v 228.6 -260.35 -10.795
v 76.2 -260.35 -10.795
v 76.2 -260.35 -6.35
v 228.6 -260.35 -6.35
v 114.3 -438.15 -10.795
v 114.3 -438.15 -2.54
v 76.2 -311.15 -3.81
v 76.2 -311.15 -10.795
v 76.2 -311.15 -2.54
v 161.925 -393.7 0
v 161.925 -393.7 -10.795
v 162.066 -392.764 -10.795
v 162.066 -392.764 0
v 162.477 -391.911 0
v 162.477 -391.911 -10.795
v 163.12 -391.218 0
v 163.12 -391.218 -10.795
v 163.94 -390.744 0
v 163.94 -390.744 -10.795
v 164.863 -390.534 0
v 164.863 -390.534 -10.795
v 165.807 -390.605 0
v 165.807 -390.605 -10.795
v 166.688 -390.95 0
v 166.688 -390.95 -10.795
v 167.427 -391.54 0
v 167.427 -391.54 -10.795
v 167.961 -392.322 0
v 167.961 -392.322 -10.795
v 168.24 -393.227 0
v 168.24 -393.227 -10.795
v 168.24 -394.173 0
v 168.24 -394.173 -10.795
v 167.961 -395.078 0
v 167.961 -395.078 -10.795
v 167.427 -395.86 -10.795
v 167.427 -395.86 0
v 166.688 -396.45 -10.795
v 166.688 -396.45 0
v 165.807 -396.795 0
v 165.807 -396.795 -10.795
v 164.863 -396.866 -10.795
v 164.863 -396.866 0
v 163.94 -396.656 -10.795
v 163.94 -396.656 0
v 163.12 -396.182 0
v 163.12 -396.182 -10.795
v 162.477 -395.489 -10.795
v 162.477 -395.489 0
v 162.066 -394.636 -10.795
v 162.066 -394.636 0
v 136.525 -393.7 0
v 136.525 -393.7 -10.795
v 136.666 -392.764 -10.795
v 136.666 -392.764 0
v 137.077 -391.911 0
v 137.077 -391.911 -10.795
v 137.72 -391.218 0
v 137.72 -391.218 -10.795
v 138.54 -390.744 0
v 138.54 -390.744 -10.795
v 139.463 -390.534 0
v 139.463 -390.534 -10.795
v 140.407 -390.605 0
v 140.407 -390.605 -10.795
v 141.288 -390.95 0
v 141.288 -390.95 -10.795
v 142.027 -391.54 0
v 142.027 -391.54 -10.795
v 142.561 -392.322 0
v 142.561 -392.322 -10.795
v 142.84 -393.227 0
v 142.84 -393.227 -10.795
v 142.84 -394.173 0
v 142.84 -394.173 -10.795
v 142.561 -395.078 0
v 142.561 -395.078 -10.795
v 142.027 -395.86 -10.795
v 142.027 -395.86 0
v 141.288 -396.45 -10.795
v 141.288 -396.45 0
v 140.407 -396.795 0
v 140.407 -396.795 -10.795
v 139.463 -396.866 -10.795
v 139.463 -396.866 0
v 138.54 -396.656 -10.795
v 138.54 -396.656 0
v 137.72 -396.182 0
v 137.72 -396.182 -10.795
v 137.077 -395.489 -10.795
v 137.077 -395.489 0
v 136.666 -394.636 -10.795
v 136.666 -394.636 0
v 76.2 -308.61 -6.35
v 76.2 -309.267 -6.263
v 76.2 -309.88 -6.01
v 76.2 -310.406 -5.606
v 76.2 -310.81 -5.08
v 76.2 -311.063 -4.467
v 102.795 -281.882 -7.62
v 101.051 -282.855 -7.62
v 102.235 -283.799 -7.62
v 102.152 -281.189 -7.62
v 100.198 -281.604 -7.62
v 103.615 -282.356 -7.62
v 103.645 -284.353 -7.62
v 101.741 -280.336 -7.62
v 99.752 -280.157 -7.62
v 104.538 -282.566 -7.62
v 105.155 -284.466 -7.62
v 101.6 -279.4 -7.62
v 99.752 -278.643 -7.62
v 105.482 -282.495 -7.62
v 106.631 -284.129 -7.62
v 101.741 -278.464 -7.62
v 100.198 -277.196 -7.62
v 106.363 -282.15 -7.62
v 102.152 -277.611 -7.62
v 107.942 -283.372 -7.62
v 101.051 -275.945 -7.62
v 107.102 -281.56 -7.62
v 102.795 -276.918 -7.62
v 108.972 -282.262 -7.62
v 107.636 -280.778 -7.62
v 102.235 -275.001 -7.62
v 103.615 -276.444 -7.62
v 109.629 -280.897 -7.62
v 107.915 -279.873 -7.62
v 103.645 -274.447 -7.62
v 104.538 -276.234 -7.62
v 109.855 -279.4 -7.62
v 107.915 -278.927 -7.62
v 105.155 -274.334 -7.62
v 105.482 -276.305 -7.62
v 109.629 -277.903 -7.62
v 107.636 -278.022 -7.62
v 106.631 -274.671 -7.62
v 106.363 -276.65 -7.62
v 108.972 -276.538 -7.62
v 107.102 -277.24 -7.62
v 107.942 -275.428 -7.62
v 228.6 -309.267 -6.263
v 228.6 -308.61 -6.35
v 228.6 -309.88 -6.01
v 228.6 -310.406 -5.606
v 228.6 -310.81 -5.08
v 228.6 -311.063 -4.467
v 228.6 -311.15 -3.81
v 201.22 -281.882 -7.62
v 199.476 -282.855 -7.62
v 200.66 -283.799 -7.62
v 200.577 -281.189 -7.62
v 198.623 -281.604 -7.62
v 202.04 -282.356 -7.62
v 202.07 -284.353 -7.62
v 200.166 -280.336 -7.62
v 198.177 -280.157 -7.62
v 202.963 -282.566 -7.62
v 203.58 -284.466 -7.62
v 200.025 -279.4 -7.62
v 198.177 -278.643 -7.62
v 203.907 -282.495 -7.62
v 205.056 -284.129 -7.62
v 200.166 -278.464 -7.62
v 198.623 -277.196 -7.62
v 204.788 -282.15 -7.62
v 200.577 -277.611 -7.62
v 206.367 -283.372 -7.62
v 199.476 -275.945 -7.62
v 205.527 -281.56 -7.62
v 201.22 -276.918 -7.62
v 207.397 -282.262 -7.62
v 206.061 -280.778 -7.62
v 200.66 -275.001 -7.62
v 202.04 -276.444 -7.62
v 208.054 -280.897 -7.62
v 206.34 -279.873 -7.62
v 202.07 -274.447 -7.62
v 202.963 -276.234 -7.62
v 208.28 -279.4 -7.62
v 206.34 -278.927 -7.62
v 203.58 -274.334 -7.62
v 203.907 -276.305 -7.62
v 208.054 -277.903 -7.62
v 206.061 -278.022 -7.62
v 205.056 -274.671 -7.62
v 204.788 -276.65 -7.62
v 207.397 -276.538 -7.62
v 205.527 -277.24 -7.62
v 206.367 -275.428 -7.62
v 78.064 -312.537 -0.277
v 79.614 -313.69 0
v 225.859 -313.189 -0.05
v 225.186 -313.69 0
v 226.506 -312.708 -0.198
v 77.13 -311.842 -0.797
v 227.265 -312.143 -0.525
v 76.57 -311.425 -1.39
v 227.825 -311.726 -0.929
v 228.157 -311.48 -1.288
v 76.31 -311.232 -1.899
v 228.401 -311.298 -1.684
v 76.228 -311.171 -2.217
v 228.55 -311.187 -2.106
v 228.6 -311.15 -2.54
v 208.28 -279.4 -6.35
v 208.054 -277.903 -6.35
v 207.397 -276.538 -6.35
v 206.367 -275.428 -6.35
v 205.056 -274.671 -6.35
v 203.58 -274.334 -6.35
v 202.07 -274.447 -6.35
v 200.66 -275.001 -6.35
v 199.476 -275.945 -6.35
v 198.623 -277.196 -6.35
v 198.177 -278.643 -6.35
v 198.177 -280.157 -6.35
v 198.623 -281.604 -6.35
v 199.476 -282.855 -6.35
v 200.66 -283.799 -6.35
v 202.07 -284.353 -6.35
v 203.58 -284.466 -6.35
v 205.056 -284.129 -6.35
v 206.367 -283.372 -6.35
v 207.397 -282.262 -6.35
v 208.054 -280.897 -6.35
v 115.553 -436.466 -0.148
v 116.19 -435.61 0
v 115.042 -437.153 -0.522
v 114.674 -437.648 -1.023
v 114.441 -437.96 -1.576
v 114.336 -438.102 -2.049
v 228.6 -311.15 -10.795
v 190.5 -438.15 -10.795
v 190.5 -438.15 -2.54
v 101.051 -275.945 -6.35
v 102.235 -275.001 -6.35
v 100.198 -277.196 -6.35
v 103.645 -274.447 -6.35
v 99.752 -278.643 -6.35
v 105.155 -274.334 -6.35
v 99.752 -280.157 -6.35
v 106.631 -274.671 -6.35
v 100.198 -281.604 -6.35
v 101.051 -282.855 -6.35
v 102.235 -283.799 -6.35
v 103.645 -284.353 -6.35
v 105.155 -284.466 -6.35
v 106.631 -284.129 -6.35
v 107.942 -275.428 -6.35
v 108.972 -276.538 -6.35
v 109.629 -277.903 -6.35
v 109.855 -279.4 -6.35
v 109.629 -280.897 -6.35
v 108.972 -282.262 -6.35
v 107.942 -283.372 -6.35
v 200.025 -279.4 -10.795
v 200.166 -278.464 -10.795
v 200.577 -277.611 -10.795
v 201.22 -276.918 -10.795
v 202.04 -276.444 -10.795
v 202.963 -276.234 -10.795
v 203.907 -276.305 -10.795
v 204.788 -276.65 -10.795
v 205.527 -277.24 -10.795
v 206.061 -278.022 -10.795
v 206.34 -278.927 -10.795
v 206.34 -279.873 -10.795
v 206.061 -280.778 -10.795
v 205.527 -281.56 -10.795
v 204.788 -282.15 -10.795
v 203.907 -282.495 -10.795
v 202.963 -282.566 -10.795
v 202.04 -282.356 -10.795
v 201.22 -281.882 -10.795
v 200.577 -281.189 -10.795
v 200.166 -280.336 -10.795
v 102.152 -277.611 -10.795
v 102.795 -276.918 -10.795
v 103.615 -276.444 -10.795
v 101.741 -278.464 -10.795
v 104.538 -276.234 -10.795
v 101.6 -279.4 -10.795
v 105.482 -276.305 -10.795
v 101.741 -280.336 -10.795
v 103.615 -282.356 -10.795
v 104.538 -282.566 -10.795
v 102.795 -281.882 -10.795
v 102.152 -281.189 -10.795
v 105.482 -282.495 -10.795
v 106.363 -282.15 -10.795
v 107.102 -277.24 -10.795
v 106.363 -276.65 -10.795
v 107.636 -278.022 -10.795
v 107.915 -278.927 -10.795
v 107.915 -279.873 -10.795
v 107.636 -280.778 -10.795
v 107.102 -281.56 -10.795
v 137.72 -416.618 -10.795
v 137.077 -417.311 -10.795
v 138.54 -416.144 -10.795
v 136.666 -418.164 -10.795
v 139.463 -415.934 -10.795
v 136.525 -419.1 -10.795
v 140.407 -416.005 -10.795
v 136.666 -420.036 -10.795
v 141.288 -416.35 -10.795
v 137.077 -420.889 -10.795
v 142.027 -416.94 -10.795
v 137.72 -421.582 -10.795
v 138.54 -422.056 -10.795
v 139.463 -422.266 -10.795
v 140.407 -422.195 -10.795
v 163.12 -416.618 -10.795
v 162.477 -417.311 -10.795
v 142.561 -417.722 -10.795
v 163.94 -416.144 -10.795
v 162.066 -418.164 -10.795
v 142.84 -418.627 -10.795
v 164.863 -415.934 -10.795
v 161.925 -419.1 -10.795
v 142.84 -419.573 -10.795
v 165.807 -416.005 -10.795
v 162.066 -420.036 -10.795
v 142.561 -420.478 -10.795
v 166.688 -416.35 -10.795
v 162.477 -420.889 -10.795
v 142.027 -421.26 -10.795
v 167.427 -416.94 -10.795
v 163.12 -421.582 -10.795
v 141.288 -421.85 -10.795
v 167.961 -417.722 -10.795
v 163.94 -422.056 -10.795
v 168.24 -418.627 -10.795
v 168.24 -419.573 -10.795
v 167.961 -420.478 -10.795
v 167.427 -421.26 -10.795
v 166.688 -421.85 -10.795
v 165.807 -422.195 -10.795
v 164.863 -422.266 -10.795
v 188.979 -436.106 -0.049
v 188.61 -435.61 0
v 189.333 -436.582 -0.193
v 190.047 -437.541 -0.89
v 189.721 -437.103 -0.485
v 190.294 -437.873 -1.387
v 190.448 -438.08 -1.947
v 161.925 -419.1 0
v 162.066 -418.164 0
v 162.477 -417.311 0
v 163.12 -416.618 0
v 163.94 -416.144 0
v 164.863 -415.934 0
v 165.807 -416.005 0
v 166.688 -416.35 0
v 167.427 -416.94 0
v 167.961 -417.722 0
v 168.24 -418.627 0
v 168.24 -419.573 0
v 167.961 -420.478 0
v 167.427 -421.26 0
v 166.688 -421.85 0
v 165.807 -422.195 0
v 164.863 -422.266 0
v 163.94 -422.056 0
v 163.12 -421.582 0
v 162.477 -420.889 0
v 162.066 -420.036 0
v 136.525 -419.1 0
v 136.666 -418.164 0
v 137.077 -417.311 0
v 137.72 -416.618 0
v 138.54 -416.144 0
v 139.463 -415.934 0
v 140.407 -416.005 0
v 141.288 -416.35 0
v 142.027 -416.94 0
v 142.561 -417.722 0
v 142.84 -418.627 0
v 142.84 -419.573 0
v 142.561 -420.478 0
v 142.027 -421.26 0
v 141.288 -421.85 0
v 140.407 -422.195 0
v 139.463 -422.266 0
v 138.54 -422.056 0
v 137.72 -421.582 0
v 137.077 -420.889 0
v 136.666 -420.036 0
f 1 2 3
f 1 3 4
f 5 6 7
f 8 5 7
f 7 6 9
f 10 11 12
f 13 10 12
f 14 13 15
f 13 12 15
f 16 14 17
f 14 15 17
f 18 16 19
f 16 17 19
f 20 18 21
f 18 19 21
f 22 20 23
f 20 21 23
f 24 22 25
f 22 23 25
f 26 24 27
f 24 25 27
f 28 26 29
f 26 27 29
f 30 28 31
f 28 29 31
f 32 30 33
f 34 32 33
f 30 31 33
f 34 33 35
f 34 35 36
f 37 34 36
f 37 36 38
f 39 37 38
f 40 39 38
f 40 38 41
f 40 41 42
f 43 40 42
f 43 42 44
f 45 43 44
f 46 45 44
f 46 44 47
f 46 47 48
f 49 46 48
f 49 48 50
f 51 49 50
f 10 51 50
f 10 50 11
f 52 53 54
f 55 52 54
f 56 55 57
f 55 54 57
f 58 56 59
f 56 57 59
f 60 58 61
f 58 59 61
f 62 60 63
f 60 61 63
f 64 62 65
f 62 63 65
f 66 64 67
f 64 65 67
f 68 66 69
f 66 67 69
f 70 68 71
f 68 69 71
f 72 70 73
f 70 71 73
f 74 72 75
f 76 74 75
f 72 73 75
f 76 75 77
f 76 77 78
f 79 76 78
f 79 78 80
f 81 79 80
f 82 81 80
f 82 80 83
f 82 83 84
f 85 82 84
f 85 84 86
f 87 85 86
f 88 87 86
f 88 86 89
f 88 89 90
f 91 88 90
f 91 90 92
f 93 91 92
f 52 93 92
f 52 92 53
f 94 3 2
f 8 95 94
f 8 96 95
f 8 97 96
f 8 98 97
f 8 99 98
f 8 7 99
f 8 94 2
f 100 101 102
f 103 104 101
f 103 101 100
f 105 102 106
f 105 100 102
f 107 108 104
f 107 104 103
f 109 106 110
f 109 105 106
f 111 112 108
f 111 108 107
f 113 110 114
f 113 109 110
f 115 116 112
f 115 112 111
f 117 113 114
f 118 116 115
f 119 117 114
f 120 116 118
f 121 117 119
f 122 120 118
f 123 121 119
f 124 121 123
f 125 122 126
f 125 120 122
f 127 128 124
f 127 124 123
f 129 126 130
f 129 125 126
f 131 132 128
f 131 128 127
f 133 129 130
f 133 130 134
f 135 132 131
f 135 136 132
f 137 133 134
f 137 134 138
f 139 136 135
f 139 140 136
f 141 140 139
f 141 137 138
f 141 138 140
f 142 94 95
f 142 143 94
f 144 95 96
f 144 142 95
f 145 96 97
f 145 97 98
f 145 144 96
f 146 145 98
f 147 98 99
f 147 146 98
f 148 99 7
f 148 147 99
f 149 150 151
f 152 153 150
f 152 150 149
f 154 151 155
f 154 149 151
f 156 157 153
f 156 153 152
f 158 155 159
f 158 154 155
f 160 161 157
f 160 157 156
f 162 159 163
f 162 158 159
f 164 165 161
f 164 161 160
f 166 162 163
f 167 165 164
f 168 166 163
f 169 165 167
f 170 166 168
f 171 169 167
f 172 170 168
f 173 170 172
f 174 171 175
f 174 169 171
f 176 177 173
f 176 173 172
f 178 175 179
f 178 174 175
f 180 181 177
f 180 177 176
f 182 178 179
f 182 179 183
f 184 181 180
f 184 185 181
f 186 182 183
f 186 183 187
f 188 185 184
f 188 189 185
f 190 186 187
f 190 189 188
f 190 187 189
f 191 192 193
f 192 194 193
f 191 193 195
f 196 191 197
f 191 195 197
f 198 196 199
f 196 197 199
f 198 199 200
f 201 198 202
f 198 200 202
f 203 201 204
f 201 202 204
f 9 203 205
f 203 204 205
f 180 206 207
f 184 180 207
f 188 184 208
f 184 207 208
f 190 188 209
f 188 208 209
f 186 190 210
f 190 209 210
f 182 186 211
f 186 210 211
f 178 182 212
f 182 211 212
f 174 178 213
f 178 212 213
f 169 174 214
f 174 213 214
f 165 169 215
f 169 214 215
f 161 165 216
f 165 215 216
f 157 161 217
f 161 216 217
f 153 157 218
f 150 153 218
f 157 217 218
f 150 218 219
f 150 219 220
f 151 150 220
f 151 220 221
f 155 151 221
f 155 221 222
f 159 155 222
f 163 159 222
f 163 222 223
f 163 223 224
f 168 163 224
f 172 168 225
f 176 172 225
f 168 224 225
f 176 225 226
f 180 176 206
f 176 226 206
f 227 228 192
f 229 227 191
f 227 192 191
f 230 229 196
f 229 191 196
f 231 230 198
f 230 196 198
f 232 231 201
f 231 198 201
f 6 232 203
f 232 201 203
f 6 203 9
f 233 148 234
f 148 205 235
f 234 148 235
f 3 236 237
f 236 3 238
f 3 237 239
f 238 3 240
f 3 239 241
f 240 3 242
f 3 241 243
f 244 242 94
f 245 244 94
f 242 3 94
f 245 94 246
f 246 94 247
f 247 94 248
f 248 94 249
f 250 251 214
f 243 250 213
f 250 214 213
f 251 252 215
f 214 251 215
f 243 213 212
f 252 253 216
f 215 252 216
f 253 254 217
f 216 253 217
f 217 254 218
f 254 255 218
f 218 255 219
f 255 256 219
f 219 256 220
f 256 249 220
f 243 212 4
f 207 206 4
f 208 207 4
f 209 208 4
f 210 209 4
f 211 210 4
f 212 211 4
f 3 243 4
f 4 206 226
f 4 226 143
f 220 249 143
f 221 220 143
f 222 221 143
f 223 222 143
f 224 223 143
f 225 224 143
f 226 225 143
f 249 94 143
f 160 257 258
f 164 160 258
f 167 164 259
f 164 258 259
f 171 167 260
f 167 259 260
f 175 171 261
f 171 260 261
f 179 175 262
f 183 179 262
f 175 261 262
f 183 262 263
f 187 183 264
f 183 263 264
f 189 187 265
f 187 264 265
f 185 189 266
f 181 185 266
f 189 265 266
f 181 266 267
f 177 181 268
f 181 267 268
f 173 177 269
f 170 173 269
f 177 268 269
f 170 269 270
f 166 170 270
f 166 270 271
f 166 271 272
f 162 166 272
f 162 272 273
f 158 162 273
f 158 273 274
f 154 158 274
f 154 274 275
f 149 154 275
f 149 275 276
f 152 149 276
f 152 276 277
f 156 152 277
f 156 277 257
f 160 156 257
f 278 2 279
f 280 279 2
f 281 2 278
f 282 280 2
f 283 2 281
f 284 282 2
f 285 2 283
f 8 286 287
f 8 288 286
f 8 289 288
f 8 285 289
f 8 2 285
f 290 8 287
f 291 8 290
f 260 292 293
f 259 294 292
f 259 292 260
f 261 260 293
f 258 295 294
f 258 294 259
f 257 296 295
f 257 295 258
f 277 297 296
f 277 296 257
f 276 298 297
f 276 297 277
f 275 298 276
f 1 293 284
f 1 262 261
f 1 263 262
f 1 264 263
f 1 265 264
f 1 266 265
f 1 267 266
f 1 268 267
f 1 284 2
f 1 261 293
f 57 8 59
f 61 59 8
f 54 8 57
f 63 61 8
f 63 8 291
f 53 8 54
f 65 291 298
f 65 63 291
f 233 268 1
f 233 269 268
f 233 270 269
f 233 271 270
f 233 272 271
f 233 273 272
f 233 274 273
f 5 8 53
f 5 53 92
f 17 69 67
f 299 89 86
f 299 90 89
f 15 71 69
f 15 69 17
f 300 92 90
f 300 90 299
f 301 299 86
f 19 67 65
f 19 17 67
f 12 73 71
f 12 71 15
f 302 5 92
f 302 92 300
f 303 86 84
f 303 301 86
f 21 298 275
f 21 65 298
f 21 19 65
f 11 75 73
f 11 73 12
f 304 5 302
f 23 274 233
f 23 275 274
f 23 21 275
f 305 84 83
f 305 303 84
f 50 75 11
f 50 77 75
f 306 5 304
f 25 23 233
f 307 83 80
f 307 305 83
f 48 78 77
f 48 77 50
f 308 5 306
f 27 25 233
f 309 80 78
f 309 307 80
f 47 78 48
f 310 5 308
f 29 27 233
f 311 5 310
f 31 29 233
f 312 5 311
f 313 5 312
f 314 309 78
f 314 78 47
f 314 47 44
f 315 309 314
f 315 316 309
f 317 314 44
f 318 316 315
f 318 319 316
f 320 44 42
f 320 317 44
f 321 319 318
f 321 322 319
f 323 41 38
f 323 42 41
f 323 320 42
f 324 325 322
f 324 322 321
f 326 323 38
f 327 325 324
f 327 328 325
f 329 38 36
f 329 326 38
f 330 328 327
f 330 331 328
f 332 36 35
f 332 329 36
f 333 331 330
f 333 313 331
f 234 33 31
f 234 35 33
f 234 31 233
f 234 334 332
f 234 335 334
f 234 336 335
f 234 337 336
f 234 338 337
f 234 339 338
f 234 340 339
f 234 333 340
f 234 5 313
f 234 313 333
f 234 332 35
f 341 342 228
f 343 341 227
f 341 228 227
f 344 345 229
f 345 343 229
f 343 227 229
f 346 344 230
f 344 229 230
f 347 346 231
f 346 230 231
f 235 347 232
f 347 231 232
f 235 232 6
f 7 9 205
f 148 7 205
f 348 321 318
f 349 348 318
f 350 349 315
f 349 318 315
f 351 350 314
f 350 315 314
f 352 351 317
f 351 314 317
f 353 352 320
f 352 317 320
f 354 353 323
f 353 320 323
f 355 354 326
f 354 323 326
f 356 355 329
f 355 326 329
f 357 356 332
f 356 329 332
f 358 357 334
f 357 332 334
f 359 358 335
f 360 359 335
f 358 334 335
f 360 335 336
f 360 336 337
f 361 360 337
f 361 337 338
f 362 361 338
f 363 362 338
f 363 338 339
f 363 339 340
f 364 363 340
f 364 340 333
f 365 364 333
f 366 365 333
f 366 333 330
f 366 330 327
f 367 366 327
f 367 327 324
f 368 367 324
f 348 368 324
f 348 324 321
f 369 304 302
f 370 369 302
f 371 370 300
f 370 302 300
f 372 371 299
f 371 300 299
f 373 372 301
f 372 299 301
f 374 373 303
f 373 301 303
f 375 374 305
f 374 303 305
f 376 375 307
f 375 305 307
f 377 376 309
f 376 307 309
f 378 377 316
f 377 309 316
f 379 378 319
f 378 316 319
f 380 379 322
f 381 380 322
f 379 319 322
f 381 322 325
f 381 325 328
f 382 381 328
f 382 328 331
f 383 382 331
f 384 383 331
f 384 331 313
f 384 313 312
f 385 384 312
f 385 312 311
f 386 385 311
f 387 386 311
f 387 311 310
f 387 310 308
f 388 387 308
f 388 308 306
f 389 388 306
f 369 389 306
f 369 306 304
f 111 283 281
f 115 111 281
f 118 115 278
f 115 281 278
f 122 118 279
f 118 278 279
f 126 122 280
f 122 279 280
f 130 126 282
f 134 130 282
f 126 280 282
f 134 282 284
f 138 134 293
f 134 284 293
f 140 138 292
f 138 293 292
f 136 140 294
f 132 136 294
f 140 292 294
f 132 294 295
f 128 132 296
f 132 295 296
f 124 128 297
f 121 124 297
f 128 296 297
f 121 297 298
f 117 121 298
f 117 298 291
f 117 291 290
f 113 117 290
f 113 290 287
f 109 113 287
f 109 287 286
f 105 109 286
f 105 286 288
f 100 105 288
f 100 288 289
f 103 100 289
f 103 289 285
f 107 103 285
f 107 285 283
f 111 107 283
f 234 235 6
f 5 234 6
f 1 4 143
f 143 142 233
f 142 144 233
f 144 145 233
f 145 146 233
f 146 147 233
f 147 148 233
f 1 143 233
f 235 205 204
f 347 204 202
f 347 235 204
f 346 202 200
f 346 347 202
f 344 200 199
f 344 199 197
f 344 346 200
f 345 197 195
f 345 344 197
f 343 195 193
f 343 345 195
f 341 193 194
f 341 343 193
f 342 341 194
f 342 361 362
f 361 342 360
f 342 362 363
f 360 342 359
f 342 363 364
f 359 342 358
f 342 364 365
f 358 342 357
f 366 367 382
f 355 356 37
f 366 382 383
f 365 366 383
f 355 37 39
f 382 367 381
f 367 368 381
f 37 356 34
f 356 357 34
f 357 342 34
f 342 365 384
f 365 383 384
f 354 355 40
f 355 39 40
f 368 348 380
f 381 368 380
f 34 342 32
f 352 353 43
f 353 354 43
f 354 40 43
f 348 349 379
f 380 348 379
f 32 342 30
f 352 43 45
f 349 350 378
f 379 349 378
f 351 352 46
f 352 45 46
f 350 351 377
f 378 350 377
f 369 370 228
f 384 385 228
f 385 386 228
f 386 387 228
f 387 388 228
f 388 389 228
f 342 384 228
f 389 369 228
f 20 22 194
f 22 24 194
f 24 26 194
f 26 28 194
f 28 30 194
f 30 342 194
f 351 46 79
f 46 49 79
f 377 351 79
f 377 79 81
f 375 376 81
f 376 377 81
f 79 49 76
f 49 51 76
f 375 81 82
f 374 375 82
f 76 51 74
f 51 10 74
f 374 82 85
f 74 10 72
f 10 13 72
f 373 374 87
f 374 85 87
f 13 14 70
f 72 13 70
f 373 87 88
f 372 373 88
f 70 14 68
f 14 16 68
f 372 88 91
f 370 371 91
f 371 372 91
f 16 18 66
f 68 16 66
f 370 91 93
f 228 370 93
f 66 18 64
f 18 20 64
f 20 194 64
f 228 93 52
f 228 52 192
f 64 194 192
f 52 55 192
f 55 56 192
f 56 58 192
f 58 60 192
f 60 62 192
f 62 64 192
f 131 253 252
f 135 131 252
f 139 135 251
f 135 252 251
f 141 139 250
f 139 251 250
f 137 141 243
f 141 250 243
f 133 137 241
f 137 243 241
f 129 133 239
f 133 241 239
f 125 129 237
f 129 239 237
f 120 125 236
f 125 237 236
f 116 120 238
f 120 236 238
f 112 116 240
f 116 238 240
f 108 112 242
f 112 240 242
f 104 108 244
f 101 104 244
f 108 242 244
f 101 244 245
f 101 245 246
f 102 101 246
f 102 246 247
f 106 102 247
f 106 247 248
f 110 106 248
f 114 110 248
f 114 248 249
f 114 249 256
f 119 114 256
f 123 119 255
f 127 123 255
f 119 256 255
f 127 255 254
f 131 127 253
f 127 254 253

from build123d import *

# Parameters (mm, degrees)
BOSS_EXTRUDE1_DEPTH = 10.795
SKETCH2_W           = 152.4
SKETCH2_H           = 4.445
BOSS_EXTRUDE2_DEPTH = 50.8
SKETCH3_R           = 3.175
CUT_EXTRUDE1_DEPTH  = 495.317625141
FILLET1_R           = 2.54
FILLET2_R           = 2.54
SKETCH4_R           = 5.08
CUT_EXTRUDE2_DEPTH  = 1.27


with BuildPart() as part:
    # Sketch1 → Boss-Extrude1 (new body)
    with BuildSketch(Plane.XY):
        Polygon((228.6, -311.15), (190.5, -438.15), (114.3, -438.15), (76.2, -311.15), align=None)
    extrude(amount=-BOSS_EXTRUDE1_DEPTH)

    # Sketch2 → Boss-Extrude2 (add)
    with BuildSketch(Plane(origin=(0, -311.15, 0), x_dir=(1, 0, 0), z_dir=(0, 1, 0))):
        with Locations((152.4, 8.5725)):
            Rectangle(SKETCH2_W, SKETCH2_H)
    extrude(amount=BOSS_EXTRUDE2_DEPTH)

    # Sketch3 → Cut-Extrude1 (cut, through all)
    with BuildSketch(Plane(origin=(0, 0, -10.795), x_dir=(-1, 0, 0), z_dir=(0, 0, -1))):
        with Locations((-104.775, -279.4)):
            Circle(SKETCH3_R)
        with Locations((-203.2, -279.4)):
            Circle(SKETCH3_R)
        with Locations((-139.7, -393.7)):
            Circle(SKETCH3_R)
        with Locations((-165.1, -393.7)):
            Circle(SKETCH3_R)
        with Locations((-139.7, -419.1)):
            Circle(SKETCH3_R)
        with Locations((-165.1, -419.1)):
            Circle(SKETCH3_R)
    extrude(amount=-CUT_EXTRUDE1_DEPTH, mode=Mode.SUBTRACT)

    # Fillet1
    fillet1_edges = [part.edges().sort_by_distance(p)[0] for p in [
        (152.4, -311.15, -6.35),
    ]]
    fillet(fillet1_edges, radius=FILLET1_R)

    # Fillet2
    fillet2_edges = [part.edges().sort_by_distance(p)[0] for p in [
        (209.55, -374.65, 0),
        (152.4, -438.15, 0),
        (95.25, -374.65, 0),
        (152.4, -311.15, 0),
    ]]
    fillet(fillet2_edges, radius=FILLET2_R)

    # Sketch4 → Cut-Extrude2 (cut)
    with BuildSketch(Plane.XY.offset(-6.35)):
        with Locations((104.775, -279.4)):
            Circle(SKETCH4_R)
        with Locations((203.2, -279.4)):
            Circle(SKETCH4_R)
    extrude(amount=-CUT_EXTRUDE2_DEPTH, mode=Mode.SUBTRACT)


solid = part.part
